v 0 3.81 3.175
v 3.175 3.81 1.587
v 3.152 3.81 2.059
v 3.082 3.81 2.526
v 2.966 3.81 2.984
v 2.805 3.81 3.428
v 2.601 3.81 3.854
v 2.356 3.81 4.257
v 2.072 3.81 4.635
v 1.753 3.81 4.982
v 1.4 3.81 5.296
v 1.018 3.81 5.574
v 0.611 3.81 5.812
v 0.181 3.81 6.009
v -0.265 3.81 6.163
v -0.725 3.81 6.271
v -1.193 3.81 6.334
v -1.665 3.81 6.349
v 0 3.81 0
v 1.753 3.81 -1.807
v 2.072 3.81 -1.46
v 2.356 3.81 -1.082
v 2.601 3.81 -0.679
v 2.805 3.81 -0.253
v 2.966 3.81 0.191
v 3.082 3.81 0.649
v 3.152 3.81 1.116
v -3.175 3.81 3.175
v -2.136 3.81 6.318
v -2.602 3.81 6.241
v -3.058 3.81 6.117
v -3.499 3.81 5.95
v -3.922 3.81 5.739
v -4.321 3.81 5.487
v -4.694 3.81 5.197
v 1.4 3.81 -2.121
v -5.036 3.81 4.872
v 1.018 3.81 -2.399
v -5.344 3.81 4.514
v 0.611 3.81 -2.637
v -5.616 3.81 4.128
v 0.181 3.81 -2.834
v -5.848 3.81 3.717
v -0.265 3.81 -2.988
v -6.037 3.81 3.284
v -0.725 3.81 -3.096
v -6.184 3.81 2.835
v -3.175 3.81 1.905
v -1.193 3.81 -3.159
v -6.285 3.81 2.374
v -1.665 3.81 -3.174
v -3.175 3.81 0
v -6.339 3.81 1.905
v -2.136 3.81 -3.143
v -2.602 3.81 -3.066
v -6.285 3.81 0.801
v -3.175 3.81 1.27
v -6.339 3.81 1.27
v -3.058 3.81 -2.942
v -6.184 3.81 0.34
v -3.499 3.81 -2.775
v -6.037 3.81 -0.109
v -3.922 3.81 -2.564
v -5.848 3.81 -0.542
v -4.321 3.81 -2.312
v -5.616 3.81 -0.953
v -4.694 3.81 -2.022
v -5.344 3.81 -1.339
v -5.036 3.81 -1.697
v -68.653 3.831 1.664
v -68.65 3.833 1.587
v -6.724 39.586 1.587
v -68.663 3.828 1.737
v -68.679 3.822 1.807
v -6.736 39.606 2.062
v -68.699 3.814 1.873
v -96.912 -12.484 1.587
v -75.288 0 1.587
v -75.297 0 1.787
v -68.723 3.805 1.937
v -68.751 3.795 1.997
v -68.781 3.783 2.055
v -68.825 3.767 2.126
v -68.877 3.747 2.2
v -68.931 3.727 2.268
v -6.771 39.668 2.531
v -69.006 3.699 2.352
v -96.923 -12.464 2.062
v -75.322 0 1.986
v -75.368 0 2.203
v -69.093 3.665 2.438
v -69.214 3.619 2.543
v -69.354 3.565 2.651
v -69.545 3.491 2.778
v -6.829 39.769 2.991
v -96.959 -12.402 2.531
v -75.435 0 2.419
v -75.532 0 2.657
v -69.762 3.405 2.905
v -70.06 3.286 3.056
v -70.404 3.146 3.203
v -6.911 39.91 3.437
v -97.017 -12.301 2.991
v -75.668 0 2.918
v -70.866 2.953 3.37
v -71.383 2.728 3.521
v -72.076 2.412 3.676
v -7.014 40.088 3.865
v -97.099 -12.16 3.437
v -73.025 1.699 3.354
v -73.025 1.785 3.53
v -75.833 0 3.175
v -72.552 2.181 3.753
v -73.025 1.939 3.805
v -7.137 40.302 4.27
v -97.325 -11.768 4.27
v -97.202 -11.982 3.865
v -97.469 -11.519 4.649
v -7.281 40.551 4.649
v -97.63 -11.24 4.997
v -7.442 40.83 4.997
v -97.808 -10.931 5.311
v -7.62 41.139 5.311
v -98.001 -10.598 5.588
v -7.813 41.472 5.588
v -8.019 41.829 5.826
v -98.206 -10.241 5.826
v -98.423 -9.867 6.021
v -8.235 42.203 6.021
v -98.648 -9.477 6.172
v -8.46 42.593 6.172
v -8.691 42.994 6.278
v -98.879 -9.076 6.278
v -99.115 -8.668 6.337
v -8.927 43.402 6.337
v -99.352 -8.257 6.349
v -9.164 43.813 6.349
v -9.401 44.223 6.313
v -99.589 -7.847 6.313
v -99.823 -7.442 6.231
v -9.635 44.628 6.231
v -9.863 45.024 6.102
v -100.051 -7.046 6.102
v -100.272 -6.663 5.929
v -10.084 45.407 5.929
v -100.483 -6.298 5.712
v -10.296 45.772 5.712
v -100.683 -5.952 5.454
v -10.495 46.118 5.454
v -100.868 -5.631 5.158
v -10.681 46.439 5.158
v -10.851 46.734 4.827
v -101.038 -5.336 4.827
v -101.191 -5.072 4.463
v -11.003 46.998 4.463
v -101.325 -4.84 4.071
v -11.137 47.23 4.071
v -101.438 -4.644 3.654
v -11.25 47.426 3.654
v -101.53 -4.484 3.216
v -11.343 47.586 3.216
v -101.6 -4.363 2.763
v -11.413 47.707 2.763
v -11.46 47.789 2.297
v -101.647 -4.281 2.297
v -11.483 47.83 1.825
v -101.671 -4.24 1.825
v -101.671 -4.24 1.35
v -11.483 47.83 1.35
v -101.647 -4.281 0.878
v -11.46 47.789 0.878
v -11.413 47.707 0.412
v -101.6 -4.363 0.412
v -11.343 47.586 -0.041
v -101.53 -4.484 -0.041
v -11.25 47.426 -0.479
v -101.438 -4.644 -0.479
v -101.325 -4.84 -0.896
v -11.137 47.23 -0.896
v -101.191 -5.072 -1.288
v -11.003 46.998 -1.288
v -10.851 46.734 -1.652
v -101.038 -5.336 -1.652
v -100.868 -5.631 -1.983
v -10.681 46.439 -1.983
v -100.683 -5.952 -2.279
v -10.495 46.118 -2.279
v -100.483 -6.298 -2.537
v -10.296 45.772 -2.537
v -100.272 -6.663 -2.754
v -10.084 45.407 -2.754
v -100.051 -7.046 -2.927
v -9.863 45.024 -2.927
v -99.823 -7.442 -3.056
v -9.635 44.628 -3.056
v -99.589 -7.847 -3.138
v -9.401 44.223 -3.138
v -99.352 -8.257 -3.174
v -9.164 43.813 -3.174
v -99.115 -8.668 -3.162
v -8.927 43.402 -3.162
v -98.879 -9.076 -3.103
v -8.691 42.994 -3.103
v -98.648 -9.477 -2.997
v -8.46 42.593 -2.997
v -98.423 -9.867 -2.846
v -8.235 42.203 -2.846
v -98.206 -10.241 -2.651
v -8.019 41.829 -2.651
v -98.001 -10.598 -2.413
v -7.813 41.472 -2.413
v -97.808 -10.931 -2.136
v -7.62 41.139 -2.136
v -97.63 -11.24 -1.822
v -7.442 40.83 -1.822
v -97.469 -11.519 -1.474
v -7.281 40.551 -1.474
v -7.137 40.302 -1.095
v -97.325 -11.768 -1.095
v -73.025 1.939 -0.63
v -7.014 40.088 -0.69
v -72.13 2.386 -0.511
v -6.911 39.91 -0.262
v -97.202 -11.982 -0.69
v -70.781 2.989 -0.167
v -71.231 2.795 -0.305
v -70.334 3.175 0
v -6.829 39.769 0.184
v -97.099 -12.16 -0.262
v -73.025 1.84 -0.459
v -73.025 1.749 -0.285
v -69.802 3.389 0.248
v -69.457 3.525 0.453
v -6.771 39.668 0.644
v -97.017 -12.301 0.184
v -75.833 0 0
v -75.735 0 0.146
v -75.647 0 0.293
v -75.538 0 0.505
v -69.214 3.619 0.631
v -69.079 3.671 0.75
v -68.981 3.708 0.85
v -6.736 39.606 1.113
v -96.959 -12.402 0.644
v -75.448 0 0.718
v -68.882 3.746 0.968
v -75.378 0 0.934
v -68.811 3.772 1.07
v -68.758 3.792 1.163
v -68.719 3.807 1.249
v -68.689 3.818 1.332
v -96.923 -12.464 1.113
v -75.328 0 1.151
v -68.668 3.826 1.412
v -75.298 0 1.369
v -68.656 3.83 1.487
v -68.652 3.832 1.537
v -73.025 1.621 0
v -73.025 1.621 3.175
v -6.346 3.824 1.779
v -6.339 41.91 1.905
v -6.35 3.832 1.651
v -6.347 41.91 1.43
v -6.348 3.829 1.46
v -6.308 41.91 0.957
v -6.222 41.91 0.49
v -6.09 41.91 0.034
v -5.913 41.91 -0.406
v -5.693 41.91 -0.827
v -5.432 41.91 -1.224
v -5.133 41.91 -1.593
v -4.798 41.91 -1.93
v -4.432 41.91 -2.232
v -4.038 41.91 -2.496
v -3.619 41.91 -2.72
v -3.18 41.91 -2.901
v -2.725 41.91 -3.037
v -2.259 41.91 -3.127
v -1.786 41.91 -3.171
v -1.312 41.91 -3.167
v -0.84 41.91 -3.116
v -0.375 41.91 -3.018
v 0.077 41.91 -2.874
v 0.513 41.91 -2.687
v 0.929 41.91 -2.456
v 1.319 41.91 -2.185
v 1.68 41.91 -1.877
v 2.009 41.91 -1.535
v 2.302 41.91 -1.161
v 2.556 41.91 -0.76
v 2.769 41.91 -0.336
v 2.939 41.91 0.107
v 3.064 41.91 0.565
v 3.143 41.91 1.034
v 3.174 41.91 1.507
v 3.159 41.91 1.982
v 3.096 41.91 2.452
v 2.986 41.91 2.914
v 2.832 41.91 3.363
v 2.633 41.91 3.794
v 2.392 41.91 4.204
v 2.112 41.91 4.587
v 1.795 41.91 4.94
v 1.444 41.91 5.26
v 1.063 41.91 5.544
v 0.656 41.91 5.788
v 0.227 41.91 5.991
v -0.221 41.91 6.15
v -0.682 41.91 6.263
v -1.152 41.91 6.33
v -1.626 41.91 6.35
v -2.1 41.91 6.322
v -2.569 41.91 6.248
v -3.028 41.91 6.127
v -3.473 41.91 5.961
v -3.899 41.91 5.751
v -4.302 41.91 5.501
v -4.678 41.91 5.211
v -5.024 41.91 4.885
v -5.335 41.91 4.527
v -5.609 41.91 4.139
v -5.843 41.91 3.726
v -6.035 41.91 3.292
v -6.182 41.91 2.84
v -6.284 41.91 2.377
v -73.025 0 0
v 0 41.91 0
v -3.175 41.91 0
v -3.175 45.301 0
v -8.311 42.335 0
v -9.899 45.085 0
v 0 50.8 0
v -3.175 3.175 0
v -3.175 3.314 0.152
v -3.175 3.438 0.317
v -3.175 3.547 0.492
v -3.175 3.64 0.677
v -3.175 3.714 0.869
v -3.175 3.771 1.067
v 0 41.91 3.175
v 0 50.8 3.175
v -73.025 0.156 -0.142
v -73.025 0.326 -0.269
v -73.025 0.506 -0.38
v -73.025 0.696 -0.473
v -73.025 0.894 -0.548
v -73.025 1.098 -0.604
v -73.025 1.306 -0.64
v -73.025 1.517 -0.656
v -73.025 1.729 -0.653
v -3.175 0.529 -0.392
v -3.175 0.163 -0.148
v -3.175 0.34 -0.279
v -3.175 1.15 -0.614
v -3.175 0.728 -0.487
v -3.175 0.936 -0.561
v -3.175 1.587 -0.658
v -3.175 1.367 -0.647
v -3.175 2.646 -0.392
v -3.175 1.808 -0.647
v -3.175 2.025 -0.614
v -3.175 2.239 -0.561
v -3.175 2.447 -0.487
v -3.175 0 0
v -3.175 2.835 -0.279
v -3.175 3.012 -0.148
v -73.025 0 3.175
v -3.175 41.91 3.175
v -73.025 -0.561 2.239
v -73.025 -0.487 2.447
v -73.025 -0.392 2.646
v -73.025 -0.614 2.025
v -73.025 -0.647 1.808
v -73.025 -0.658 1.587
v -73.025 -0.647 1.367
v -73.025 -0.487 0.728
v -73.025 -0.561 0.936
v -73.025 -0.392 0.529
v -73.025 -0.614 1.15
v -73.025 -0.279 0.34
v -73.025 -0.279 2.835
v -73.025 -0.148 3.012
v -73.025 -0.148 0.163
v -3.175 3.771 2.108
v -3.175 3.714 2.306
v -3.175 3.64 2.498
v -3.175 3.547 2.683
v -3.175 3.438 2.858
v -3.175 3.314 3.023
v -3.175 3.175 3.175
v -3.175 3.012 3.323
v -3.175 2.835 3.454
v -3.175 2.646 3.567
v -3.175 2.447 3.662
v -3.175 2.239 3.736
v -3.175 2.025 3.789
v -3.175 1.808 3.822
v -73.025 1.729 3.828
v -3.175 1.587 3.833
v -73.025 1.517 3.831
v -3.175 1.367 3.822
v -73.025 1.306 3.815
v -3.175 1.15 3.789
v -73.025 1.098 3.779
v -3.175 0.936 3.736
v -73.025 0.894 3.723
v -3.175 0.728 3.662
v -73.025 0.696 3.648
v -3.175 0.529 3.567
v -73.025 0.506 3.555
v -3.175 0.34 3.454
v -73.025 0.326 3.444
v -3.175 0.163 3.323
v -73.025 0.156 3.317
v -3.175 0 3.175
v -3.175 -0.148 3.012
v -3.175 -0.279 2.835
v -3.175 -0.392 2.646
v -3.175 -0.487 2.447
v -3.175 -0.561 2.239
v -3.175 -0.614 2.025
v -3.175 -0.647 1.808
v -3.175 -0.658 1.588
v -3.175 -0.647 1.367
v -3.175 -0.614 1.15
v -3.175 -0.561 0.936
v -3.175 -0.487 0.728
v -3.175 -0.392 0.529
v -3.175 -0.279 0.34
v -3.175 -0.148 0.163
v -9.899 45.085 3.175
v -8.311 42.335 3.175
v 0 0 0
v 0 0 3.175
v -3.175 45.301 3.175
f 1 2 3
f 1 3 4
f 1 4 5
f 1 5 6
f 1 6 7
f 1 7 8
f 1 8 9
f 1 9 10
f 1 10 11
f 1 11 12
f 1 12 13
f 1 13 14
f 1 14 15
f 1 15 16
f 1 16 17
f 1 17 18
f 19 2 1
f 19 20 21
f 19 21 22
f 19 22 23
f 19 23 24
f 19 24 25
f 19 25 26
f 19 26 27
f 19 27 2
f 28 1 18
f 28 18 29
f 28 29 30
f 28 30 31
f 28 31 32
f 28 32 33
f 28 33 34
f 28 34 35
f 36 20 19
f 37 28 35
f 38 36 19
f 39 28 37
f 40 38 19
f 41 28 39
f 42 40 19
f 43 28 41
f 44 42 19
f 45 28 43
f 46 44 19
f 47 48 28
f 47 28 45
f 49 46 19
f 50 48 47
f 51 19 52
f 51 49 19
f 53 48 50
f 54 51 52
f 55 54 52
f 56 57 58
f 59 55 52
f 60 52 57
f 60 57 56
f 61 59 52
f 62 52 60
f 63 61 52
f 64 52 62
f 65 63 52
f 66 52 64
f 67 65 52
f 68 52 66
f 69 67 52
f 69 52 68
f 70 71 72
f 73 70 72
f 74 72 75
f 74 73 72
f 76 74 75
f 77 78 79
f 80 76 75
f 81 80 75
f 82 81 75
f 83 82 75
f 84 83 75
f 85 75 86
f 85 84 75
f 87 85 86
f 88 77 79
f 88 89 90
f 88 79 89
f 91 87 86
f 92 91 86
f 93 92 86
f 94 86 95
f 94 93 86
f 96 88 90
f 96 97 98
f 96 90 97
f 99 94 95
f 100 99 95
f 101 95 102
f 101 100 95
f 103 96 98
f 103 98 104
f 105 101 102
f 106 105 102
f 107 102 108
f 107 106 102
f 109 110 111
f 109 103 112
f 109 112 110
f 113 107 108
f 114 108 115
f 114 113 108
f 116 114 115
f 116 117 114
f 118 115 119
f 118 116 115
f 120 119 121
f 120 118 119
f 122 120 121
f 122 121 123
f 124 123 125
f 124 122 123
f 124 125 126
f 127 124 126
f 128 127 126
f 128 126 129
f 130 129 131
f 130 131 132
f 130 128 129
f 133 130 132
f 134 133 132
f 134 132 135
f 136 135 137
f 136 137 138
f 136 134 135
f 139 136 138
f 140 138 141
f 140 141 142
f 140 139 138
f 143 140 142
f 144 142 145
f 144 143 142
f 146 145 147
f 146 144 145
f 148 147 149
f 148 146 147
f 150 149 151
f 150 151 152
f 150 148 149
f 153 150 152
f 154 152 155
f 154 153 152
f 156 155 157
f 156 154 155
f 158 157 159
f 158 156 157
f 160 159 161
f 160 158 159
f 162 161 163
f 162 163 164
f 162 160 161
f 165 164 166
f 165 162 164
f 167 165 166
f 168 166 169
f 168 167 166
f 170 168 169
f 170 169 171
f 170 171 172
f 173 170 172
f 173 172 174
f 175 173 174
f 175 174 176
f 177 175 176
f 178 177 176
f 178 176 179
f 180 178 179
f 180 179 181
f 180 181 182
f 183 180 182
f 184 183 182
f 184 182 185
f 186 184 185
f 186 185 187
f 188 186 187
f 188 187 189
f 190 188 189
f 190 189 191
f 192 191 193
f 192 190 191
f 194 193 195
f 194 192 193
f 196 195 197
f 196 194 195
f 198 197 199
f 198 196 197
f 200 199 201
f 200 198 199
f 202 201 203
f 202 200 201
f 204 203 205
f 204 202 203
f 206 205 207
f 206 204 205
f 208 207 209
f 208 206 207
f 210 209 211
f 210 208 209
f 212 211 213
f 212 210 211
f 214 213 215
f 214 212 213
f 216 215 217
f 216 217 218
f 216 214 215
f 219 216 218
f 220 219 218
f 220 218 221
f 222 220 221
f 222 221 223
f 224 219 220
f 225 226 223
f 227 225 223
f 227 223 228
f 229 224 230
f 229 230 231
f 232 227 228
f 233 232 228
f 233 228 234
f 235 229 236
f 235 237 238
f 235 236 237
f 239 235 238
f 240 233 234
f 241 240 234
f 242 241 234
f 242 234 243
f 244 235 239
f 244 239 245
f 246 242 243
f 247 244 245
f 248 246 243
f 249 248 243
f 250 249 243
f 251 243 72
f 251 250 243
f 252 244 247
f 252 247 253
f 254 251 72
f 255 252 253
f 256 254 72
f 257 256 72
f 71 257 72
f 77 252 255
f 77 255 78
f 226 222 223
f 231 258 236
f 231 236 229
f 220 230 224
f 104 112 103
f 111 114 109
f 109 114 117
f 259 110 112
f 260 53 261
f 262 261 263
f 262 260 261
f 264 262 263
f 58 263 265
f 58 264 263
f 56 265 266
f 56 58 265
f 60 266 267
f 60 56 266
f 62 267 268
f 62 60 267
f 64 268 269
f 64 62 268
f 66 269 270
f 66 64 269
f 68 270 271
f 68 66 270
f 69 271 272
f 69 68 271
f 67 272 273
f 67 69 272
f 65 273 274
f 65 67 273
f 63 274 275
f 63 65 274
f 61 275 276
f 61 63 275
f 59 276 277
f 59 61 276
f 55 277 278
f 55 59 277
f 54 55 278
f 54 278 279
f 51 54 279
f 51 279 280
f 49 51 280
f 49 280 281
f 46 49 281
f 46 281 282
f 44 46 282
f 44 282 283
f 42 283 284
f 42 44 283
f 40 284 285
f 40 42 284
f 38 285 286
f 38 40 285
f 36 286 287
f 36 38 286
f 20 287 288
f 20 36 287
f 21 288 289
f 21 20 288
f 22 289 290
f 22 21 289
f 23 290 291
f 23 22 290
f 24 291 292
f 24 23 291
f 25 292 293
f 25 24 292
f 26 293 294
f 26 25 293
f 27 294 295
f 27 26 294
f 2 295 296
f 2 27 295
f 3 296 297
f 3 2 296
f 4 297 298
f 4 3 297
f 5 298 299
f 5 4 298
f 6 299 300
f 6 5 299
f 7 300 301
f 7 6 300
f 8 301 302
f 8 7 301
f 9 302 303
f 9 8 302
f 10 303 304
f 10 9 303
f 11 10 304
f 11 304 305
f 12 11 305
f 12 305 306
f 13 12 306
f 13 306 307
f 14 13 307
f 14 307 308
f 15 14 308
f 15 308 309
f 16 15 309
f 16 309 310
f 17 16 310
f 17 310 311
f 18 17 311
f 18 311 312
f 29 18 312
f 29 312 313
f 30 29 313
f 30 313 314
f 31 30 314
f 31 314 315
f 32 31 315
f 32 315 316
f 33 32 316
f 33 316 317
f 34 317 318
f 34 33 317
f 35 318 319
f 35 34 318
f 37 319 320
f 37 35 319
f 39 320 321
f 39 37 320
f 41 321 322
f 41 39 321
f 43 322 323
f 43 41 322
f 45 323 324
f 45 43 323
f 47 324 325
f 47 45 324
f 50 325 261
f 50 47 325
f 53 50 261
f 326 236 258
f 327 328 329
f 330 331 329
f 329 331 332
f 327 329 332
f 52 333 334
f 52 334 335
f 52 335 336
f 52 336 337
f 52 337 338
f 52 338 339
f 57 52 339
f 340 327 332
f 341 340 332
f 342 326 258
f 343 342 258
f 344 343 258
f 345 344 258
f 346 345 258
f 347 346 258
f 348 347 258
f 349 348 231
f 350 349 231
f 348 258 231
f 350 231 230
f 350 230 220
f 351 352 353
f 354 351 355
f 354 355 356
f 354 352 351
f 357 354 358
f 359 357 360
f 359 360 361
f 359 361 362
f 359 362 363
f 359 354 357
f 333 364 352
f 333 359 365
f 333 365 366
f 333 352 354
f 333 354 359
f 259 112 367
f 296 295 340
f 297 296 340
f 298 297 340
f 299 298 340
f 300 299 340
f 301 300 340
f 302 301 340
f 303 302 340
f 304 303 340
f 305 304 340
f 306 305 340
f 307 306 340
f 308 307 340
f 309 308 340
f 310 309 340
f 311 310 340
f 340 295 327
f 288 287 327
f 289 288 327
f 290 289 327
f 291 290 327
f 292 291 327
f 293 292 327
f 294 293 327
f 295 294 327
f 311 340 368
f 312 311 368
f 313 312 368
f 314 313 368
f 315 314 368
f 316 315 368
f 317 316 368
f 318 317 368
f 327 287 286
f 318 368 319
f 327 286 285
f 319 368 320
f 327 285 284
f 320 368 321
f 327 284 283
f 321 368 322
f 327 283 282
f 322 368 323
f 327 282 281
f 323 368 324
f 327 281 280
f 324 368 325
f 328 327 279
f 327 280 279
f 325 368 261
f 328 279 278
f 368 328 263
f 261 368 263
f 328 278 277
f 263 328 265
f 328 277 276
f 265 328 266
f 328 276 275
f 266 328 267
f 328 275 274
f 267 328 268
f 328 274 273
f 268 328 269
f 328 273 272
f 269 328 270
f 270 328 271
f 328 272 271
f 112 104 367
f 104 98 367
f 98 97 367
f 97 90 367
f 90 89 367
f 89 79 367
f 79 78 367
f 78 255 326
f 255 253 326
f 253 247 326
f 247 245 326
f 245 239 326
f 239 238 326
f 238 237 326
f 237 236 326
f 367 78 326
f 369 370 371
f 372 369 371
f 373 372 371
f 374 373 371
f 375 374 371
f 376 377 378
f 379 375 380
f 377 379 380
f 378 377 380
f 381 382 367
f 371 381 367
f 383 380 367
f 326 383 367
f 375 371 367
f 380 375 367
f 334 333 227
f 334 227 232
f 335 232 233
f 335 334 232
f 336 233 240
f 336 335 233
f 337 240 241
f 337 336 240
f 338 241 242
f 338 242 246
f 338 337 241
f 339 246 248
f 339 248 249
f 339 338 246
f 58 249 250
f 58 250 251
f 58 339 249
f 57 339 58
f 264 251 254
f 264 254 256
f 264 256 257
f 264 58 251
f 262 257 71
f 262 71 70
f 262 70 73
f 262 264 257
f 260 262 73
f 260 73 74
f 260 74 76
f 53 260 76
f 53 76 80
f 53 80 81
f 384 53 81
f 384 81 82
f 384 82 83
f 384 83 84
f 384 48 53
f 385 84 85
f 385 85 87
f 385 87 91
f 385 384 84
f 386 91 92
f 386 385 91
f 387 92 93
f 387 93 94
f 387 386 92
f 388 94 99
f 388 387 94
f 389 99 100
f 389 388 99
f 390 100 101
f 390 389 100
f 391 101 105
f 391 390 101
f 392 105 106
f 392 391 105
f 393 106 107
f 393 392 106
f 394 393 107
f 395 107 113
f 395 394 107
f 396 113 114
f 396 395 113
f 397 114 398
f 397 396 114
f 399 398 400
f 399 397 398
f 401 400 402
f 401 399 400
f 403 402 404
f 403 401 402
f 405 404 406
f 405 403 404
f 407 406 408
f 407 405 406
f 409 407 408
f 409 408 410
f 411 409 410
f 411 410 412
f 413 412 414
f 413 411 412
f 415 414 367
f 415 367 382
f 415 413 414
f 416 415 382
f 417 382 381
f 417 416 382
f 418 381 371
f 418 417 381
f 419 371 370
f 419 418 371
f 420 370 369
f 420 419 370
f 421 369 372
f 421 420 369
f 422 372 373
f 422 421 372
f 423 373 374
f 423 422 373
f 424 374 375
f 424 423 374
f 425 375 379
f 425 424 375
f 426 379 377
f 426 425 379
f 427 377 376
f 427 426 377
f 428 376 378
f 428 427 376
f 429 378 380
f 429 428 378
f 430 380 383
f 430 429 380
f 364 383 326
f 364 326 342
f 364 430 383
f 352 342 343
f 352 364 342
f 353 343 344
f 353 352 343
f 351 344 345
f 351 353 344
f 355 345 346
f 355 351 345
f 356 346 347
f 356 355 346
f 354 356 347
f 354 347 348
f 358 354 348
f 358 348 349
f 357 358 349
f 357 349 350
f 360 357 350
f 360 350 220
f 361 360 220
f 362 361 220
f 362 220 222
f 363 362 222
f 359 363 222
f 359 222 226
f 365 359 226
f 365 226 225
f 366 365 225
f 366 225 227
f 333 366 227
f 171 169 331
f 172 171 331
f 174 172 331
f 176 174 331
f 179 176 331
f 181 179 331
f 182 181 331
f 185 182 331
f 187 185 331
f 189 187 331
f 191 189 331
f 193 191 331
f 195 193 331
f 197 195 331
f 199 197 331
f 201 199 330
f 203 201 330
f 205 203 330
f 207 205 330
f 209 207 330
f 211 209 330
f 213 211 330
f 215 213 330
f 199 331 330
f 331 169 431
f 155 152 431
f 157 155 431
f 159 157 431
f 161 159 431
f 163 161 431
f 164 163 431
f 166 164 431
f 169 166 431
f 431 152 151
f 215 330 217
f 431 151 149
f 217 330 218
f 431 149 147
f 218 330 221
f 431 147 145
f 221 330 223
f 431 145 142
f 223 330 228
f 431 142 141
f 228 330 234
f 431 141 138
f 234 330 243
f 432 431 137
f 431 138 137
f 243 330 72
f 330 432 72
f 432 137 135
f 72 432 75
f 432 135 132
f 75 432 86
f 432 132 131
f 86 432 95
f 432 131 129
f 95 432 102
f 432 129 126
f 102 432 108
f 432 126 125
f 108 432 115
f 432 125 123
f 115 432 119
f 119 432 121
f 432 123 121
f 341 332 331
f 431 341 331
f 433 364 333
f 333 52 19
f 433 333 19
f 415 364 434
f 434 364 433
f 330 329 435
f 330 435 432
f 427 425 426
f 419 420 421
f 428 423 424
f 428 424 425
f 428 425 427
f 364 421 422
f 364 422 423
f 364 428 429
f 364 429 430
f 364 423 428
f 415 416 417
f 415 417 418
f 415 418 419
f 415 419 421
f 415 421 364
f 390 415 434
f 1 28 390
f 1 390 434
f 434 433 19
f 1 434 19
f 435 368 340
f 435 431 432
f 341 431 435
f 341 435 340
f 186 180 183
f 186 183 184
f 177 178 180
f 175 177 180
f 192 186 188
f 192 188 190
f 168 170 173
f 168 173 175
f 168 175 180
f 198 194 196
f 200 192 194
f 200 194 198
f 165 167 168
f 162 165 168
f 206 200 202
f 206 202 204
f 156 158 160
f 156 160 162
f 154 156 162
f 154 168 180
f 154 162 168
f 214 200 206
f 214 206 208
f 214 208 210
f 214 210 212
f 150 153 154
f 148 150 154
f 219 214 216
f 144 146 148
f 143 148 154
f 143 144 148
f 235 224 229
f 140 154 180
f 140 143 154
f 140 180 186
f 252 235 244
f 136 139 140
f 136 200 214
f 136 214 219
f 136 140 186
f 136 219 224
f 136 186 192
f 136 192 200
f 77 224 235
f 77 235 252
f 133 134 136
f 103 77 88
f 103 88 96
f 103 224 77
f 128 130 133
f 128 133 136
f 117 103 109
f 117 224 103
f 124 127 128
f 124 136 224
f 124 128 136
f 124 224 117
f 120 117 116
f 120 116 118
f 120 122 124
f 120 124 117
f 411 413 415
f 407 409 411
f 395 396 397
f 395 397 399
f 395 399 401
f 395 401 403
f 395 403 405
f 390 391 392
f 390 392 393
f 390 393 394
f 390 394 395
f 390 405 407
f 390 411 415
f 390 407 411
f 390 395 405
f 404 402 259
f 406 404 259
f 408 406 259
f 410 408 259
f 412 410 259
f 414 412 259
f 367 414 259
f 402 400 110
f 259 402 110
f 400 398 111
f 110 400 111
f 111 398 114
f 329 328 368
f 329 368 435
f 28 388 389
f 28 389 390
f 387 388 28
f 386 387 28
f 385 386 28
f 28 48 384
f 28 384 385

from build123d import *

# Parameters (mm, degrees)
BOSS_EXTRUDE1_DEPTH = 3.175
BOSS_EXTRUDE2_START = -3.175
SKETCH2_R           = 2.24506403
BOSS_EXTRUDE2_DEPTH = 69.85
SKETCH4_R           = 4.7625
BOSS_EXTRUDE4_DEPTH = 19.05
SKETCH5_R           = 4.7625
BOSS_EXTRUDE5_DEPTH = 52.07


with BuildPart() as part:
    # Sketch1 → Boss-Extrude1 (new body)
    with BuildSketch(Plane.XY):
        Polygon((0, 0), (0, 50.8), (-87.988181024, 0), align=None)
        Polygon((-76.13891971, 3.175), (-3.175, 3.175), (-3.175, 45.300738686), align=None, mode=Mode.SUBTRACT)
    extrude(amount=BOSS_EXTRUDE1_DEPTH)

    # Sketch2 → Boss-Extrude2 (add)
    with BuildSketch(Plane(origin=(0, 0, 0), x_dir=(0, 0, -1), z_dir=(1, 0, 0)).offset(BOSS_EXTRUDE2_START)):
        with Locations(Location((-1.5875, 1.5875, 0), (0, 0, 45))):
            Circle(SKETCH2_R)
    extrude(amount=-BOSS_EXTRUDE2_DEPTH)

    # Sketch4 → Boss-Extrude4 (add, symmetric)
    with BuildSketch(Plane(origin=(0, 22.86, 0), x_dir=(-1, 0, 0), z_dir=(0, -1, 0))):
        with Locations(Location((1.5875, -1.5875, 0), (0, 0, 356.177446271))):
            Circle(SKETCH4_R)
    extrude(amount=BOSS_EXTRUDE4_DEPTH, both=True)

    # Sketch5 → Boss-Extrude5 (add, symmetric)
    with BuildSketch(Plane(origin=(-32.995567884, -19.05, 0), x_dir=(0, 0, -1), z_dir=(-0.8660254037844416, -0.49999999999999495, 0))):
        with Locations(Location((-1.5875, -42.406590512, 0), (0, 0, 90))):
            Circle(SKETCH5_R)
    extrude(amount=BOSS_EXTRUDE5_DEPTH, both=True)


solid = part.part
